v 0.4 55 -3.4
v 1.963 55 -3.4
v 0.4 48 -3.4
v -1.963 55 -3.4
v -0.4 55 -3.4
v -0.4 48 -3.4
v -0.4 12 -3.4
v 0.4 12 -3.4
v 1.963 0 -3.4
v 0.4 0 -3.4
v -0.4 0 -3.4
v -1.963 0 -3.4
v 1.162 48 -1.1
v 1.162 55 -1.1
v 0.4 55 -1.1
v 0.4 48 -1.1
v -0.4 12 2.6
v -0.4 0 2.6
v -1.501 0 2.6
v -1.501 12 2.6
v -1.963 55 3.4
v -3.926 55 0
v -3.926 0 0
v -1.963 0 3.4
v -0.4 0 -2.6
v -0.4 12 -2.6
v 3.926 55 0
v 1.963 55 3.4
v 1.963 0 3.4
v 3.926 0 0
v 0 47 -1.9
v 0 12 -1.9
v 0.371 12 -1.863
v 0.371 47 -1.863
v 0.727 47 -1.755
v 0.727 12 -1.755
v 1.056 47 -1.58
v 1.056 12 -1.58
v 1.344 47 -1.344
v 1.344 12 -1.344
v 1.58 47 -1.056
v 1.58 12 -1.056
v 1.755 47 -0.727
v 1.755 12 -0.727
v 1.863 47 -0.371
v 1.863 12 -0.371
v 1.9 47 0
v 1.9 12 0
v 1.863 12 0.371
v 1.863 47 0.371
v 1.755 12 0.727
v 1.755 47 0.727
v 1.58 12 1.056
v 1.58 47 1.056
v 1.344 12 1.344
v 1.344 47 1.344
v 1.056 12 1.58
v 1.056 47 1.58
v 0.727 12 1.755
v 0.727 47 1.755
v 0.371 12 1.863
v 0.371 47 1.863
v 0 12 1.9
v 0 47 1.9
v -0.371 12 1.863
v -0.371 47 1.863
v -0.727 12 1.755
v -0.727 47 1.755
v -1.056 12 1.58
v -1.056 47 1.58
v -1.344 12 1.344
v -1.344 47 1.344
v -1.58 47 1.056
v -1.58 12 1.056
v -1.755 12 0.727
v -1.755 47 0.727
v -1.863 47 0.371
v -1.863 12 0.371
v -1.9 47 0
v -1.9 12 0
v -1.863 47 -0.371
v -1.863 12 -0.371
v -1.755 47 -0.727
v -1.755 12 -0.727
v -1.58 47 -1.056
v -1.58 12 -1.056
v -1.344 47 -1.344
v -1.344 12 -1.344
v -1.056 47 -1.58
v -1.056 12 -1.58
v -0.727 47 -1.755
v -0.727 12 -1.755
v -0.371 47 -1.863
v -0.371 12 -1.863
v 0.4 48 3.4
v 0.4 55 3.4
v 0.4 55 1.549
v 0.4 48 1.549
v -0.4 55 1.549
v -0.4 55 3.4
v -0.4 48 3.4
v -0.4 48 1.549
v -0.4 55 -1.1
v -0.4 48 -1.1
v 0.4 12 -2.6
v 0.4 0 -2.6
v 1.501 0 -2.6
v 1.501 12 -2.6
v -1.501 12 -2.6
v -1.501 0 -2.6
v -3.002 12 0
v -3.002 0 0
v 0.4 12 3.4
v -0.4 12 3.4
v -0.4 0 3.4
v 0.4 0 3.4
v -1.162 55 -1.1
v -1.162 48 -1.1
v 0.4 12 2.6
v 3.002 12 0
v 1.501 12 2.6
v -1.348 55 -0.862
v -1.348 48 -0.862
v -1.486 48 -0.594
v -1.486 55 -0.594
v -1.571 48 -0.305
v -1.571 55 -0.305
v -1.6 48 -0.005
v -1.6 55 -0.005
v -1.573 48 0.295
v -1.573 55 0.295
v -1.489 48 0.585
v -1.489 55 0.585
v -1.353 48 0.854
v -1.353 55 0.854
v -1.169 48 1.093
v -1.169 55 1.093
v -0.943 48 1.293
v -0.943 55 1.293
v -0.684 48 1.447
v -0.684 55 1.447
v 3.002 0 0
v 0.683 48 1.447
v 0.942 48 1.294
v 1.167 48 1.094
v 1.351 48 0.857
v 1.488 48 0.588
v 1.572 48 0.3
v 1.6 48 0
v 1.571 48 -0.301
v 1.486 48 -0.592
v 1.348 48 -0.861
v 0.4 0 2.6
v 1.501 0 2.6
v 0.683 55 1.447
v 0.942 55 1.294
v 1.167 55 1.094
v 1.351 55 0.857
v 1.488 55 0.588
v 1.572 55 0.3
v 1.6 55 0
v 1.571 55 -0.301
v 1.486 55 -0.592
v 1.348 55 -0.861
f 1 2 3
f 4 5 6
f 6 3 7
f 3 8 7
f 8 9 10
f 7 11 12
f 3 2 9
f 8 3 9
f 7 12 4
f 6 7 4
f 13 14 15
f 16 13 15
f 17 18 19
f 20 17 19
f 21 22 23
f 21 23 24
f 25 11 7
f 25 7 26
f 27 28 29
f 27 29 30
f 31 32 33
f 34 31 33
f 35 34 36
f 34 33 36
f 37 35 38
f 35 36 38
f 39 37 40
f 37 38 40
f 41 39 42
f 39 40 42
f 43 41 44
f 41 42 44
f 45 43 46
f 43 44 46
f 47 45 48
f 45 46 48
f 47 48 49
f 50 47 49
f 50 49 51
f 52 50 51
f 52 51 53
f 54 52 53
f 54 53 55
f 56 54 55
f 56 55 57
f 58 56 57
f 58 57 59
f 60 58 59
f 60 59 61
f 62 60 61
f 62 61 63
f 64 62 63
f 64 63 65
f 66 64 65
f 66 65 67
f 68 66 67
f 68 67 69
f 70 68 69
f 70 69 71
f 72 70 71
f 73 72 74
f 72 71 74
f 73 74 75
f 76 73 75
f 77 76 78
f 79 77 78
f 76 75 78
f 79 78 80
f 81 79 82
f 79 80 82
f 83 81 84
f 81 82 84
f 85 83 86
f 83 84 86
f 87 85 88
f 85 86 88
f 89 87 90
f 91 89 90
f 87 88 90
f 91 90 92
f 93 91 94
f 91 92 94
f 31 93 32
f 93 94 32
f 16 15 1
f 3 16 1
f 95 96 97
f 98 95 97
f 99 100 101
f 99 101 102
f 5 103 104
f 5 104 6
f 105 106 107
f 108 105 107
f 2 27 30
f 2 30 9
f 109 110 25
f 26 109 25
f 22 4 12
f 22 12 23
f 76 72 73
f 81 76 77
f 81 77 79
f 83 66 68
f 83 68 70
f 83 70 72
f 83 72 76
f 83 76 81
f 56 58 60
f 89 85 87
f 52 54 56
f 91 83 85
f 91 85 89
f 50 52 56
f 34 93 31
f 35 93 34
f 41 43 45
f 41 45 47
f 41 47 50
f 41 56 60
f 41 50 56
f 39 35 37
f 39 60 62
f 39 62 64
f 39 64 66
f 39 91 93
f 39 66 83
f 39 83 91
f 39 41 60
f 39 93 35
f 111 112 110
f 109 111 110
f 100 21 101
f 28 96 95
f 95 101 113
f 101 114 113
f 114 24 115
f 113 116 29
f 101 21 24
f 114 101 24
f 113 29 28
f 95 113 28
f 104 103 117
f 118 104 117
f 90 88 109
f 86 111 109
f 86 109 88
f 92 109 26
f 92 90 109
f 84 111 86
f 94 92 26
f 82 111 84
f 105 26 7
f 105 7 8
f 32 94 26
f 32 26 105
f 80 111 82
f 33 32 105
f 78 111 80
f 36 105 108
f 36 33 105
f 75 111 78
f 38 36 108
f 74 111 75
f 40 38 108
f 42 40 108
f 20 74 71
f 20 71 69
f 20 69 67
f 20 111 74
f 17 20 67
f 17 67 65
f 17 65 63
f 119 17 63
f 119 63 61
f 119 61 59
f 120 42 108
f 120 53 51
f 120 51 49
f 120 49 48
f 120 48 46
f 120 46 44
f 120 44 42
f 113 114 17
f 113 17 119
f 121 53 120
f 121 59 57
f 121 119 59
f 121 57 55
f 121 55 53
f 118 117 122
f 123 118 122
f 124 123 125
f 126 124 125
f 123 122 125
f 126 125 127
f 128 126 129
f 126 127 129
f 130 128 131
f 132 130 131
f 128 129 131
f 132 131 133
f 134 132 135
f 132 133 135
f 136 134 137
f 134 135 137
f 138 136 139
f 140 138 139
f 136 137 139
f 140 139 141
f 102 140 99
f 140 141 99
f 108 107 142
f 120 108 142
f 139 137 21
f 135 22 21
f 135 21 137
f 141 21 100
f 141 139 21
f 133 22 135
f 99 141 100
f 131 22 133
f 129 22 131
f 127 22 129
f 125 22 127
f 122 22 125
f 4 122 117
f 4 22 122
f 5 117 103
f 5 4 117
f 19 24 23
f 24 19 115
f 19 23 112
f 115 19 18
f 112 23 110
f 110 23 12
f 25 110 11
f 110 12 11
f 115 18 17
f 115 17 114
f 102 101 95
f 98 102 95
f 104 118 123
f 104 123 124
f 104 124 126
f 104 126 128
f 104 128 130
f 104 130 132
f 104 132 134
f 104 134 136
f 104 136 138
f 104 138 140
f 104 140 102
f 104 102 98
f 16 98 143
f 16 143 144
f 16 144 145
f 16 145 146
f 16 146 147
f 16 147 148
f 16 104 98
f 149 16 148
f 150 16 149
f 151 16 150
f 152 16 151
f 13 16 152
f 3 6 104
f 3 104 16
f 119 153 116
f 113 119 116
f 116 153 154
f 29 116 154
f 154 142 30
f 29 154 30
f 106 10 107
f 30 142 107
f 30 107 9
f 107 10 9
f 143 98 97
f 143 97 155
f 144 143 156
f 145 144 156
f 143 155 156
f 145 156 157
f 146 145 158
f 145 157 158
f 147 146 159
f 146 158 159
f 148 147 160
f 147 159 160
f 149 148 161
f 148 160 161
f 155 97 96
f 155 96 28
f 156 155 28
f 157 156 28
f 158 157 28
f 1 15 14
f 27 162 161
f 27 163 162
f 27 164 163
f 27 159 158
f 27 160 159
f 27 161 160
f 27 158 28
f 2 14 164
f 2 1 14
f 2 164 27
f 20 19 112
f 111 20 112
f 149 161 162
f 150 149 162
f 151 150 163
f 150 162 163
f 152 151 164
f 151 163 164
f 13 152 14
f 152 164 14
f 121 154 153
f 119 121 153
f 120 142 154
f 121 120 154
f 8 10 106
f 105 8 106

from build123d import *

# Parameters (mm, degrees)
EXTRUDE_1_DEPTH     = 55
CUT_EXTRUDE_1_DEPTH = 7
CUT_EXTRUDE_2_DEPTH = 12
SKETCH_5_R          = 1.9
CUT_EXTRUDE_3_DEPTH = 35
SKETCH_6_W          = 0.8
SKETCH_6_H          = 6.8
CUT_EXTRUDE_4_DEPTH = 7
SKETCH_7_W          = 0.8
SKETCH_7_H          = 6.8
CUT_EXTRUDE_5_DEPTH = 12


with BuildPart() as part:
    # 草图2 → 凸台-拉伸1 (new body)
    with BuildSketch(Plane(origin=(0, 0, 0), x_dir=(1, 0, 0), z_dir=(0, 1, 0))):
        Polygon((3.92598183, 0), (1.962990915, 3.4), (-1.962990915, 3.4), (-3.92598183, 0), (-1.962990915, -3.4), (1.962990915, -3.4), align=None)
    extrude(amount=EXTRUDE_1_DEPTH)

    # 草图3 → 切除-拉伸1 (cut)
    with BuildSketch(Plane(origin=(0, 55, 0), x_dir=(1, 0, 0), z_dir=(0, 1, 0))):
        with BuildLine():
            Line((1.161895004, 1.1), (-1.161895004, 1.1))
            ThreePointArc((-1.161895004, 1.1), (-0.592016889, -1.48644408), (1.6, 0))
            ThreePointArc((1.6, 0), (1.48644408, 0.592016889), (1.161895004, 1.1))
        make_face()
    extrude(amount=-CUT_EXTRUDE_1_DEPTH, mode=Mode.SUBTRACT)

    # 草图4 → 切除-拉伸2 (cut)
    with BuildSketch(Plane.XZ):
        Polygon((-1.5011107, -2.6), (1.5011107, -2.6), (3.0022214, 0), (1.5011107, 2.6), (-1.5011107, 2.6), (-3.0022214, 0), align=None)
    extrude(amount=-CUT_EXTRUDE_2_DEPTH, mode=Mode.SUBTRACT)

    # 草图5 → 切除-拉伸3 (cut)
    with BuildSketch(Plane.XZ.offset(-12)):
        with Locations(Location((0, 0, 0), (0, 0, 270))):
            Circle(SKETCH_5_R)
    extrude(amount=-CUT_EXTRUDE_3_DEPTH, mode=Mode.SUBTRACT)

    # 草图6 → 切除-拉伸4 (cut)
    with BuildSketch(Plane(origin=(0, 55, 0), x_dir=(1, 0, 0), z_dir=(0, 1, 0))):
        Rectangle(SKETCH_6_W, SKETCH_6_H)
    extrude(amount=-CUT_EXTRUDE_4_DEPTH, mode=Mode.SUBTRACT)

    # 草图7 → 切除-拉伸5 (cut)
    with BuildSketch(Plane.XZ):
        Rectangle(SKETCH_7_W, SKETCH_7_H)
    extrude(amount=-CUT_EXTRUDE_5_DEPTH, mode=Mode.SUBTRACT)


solid = part.part
